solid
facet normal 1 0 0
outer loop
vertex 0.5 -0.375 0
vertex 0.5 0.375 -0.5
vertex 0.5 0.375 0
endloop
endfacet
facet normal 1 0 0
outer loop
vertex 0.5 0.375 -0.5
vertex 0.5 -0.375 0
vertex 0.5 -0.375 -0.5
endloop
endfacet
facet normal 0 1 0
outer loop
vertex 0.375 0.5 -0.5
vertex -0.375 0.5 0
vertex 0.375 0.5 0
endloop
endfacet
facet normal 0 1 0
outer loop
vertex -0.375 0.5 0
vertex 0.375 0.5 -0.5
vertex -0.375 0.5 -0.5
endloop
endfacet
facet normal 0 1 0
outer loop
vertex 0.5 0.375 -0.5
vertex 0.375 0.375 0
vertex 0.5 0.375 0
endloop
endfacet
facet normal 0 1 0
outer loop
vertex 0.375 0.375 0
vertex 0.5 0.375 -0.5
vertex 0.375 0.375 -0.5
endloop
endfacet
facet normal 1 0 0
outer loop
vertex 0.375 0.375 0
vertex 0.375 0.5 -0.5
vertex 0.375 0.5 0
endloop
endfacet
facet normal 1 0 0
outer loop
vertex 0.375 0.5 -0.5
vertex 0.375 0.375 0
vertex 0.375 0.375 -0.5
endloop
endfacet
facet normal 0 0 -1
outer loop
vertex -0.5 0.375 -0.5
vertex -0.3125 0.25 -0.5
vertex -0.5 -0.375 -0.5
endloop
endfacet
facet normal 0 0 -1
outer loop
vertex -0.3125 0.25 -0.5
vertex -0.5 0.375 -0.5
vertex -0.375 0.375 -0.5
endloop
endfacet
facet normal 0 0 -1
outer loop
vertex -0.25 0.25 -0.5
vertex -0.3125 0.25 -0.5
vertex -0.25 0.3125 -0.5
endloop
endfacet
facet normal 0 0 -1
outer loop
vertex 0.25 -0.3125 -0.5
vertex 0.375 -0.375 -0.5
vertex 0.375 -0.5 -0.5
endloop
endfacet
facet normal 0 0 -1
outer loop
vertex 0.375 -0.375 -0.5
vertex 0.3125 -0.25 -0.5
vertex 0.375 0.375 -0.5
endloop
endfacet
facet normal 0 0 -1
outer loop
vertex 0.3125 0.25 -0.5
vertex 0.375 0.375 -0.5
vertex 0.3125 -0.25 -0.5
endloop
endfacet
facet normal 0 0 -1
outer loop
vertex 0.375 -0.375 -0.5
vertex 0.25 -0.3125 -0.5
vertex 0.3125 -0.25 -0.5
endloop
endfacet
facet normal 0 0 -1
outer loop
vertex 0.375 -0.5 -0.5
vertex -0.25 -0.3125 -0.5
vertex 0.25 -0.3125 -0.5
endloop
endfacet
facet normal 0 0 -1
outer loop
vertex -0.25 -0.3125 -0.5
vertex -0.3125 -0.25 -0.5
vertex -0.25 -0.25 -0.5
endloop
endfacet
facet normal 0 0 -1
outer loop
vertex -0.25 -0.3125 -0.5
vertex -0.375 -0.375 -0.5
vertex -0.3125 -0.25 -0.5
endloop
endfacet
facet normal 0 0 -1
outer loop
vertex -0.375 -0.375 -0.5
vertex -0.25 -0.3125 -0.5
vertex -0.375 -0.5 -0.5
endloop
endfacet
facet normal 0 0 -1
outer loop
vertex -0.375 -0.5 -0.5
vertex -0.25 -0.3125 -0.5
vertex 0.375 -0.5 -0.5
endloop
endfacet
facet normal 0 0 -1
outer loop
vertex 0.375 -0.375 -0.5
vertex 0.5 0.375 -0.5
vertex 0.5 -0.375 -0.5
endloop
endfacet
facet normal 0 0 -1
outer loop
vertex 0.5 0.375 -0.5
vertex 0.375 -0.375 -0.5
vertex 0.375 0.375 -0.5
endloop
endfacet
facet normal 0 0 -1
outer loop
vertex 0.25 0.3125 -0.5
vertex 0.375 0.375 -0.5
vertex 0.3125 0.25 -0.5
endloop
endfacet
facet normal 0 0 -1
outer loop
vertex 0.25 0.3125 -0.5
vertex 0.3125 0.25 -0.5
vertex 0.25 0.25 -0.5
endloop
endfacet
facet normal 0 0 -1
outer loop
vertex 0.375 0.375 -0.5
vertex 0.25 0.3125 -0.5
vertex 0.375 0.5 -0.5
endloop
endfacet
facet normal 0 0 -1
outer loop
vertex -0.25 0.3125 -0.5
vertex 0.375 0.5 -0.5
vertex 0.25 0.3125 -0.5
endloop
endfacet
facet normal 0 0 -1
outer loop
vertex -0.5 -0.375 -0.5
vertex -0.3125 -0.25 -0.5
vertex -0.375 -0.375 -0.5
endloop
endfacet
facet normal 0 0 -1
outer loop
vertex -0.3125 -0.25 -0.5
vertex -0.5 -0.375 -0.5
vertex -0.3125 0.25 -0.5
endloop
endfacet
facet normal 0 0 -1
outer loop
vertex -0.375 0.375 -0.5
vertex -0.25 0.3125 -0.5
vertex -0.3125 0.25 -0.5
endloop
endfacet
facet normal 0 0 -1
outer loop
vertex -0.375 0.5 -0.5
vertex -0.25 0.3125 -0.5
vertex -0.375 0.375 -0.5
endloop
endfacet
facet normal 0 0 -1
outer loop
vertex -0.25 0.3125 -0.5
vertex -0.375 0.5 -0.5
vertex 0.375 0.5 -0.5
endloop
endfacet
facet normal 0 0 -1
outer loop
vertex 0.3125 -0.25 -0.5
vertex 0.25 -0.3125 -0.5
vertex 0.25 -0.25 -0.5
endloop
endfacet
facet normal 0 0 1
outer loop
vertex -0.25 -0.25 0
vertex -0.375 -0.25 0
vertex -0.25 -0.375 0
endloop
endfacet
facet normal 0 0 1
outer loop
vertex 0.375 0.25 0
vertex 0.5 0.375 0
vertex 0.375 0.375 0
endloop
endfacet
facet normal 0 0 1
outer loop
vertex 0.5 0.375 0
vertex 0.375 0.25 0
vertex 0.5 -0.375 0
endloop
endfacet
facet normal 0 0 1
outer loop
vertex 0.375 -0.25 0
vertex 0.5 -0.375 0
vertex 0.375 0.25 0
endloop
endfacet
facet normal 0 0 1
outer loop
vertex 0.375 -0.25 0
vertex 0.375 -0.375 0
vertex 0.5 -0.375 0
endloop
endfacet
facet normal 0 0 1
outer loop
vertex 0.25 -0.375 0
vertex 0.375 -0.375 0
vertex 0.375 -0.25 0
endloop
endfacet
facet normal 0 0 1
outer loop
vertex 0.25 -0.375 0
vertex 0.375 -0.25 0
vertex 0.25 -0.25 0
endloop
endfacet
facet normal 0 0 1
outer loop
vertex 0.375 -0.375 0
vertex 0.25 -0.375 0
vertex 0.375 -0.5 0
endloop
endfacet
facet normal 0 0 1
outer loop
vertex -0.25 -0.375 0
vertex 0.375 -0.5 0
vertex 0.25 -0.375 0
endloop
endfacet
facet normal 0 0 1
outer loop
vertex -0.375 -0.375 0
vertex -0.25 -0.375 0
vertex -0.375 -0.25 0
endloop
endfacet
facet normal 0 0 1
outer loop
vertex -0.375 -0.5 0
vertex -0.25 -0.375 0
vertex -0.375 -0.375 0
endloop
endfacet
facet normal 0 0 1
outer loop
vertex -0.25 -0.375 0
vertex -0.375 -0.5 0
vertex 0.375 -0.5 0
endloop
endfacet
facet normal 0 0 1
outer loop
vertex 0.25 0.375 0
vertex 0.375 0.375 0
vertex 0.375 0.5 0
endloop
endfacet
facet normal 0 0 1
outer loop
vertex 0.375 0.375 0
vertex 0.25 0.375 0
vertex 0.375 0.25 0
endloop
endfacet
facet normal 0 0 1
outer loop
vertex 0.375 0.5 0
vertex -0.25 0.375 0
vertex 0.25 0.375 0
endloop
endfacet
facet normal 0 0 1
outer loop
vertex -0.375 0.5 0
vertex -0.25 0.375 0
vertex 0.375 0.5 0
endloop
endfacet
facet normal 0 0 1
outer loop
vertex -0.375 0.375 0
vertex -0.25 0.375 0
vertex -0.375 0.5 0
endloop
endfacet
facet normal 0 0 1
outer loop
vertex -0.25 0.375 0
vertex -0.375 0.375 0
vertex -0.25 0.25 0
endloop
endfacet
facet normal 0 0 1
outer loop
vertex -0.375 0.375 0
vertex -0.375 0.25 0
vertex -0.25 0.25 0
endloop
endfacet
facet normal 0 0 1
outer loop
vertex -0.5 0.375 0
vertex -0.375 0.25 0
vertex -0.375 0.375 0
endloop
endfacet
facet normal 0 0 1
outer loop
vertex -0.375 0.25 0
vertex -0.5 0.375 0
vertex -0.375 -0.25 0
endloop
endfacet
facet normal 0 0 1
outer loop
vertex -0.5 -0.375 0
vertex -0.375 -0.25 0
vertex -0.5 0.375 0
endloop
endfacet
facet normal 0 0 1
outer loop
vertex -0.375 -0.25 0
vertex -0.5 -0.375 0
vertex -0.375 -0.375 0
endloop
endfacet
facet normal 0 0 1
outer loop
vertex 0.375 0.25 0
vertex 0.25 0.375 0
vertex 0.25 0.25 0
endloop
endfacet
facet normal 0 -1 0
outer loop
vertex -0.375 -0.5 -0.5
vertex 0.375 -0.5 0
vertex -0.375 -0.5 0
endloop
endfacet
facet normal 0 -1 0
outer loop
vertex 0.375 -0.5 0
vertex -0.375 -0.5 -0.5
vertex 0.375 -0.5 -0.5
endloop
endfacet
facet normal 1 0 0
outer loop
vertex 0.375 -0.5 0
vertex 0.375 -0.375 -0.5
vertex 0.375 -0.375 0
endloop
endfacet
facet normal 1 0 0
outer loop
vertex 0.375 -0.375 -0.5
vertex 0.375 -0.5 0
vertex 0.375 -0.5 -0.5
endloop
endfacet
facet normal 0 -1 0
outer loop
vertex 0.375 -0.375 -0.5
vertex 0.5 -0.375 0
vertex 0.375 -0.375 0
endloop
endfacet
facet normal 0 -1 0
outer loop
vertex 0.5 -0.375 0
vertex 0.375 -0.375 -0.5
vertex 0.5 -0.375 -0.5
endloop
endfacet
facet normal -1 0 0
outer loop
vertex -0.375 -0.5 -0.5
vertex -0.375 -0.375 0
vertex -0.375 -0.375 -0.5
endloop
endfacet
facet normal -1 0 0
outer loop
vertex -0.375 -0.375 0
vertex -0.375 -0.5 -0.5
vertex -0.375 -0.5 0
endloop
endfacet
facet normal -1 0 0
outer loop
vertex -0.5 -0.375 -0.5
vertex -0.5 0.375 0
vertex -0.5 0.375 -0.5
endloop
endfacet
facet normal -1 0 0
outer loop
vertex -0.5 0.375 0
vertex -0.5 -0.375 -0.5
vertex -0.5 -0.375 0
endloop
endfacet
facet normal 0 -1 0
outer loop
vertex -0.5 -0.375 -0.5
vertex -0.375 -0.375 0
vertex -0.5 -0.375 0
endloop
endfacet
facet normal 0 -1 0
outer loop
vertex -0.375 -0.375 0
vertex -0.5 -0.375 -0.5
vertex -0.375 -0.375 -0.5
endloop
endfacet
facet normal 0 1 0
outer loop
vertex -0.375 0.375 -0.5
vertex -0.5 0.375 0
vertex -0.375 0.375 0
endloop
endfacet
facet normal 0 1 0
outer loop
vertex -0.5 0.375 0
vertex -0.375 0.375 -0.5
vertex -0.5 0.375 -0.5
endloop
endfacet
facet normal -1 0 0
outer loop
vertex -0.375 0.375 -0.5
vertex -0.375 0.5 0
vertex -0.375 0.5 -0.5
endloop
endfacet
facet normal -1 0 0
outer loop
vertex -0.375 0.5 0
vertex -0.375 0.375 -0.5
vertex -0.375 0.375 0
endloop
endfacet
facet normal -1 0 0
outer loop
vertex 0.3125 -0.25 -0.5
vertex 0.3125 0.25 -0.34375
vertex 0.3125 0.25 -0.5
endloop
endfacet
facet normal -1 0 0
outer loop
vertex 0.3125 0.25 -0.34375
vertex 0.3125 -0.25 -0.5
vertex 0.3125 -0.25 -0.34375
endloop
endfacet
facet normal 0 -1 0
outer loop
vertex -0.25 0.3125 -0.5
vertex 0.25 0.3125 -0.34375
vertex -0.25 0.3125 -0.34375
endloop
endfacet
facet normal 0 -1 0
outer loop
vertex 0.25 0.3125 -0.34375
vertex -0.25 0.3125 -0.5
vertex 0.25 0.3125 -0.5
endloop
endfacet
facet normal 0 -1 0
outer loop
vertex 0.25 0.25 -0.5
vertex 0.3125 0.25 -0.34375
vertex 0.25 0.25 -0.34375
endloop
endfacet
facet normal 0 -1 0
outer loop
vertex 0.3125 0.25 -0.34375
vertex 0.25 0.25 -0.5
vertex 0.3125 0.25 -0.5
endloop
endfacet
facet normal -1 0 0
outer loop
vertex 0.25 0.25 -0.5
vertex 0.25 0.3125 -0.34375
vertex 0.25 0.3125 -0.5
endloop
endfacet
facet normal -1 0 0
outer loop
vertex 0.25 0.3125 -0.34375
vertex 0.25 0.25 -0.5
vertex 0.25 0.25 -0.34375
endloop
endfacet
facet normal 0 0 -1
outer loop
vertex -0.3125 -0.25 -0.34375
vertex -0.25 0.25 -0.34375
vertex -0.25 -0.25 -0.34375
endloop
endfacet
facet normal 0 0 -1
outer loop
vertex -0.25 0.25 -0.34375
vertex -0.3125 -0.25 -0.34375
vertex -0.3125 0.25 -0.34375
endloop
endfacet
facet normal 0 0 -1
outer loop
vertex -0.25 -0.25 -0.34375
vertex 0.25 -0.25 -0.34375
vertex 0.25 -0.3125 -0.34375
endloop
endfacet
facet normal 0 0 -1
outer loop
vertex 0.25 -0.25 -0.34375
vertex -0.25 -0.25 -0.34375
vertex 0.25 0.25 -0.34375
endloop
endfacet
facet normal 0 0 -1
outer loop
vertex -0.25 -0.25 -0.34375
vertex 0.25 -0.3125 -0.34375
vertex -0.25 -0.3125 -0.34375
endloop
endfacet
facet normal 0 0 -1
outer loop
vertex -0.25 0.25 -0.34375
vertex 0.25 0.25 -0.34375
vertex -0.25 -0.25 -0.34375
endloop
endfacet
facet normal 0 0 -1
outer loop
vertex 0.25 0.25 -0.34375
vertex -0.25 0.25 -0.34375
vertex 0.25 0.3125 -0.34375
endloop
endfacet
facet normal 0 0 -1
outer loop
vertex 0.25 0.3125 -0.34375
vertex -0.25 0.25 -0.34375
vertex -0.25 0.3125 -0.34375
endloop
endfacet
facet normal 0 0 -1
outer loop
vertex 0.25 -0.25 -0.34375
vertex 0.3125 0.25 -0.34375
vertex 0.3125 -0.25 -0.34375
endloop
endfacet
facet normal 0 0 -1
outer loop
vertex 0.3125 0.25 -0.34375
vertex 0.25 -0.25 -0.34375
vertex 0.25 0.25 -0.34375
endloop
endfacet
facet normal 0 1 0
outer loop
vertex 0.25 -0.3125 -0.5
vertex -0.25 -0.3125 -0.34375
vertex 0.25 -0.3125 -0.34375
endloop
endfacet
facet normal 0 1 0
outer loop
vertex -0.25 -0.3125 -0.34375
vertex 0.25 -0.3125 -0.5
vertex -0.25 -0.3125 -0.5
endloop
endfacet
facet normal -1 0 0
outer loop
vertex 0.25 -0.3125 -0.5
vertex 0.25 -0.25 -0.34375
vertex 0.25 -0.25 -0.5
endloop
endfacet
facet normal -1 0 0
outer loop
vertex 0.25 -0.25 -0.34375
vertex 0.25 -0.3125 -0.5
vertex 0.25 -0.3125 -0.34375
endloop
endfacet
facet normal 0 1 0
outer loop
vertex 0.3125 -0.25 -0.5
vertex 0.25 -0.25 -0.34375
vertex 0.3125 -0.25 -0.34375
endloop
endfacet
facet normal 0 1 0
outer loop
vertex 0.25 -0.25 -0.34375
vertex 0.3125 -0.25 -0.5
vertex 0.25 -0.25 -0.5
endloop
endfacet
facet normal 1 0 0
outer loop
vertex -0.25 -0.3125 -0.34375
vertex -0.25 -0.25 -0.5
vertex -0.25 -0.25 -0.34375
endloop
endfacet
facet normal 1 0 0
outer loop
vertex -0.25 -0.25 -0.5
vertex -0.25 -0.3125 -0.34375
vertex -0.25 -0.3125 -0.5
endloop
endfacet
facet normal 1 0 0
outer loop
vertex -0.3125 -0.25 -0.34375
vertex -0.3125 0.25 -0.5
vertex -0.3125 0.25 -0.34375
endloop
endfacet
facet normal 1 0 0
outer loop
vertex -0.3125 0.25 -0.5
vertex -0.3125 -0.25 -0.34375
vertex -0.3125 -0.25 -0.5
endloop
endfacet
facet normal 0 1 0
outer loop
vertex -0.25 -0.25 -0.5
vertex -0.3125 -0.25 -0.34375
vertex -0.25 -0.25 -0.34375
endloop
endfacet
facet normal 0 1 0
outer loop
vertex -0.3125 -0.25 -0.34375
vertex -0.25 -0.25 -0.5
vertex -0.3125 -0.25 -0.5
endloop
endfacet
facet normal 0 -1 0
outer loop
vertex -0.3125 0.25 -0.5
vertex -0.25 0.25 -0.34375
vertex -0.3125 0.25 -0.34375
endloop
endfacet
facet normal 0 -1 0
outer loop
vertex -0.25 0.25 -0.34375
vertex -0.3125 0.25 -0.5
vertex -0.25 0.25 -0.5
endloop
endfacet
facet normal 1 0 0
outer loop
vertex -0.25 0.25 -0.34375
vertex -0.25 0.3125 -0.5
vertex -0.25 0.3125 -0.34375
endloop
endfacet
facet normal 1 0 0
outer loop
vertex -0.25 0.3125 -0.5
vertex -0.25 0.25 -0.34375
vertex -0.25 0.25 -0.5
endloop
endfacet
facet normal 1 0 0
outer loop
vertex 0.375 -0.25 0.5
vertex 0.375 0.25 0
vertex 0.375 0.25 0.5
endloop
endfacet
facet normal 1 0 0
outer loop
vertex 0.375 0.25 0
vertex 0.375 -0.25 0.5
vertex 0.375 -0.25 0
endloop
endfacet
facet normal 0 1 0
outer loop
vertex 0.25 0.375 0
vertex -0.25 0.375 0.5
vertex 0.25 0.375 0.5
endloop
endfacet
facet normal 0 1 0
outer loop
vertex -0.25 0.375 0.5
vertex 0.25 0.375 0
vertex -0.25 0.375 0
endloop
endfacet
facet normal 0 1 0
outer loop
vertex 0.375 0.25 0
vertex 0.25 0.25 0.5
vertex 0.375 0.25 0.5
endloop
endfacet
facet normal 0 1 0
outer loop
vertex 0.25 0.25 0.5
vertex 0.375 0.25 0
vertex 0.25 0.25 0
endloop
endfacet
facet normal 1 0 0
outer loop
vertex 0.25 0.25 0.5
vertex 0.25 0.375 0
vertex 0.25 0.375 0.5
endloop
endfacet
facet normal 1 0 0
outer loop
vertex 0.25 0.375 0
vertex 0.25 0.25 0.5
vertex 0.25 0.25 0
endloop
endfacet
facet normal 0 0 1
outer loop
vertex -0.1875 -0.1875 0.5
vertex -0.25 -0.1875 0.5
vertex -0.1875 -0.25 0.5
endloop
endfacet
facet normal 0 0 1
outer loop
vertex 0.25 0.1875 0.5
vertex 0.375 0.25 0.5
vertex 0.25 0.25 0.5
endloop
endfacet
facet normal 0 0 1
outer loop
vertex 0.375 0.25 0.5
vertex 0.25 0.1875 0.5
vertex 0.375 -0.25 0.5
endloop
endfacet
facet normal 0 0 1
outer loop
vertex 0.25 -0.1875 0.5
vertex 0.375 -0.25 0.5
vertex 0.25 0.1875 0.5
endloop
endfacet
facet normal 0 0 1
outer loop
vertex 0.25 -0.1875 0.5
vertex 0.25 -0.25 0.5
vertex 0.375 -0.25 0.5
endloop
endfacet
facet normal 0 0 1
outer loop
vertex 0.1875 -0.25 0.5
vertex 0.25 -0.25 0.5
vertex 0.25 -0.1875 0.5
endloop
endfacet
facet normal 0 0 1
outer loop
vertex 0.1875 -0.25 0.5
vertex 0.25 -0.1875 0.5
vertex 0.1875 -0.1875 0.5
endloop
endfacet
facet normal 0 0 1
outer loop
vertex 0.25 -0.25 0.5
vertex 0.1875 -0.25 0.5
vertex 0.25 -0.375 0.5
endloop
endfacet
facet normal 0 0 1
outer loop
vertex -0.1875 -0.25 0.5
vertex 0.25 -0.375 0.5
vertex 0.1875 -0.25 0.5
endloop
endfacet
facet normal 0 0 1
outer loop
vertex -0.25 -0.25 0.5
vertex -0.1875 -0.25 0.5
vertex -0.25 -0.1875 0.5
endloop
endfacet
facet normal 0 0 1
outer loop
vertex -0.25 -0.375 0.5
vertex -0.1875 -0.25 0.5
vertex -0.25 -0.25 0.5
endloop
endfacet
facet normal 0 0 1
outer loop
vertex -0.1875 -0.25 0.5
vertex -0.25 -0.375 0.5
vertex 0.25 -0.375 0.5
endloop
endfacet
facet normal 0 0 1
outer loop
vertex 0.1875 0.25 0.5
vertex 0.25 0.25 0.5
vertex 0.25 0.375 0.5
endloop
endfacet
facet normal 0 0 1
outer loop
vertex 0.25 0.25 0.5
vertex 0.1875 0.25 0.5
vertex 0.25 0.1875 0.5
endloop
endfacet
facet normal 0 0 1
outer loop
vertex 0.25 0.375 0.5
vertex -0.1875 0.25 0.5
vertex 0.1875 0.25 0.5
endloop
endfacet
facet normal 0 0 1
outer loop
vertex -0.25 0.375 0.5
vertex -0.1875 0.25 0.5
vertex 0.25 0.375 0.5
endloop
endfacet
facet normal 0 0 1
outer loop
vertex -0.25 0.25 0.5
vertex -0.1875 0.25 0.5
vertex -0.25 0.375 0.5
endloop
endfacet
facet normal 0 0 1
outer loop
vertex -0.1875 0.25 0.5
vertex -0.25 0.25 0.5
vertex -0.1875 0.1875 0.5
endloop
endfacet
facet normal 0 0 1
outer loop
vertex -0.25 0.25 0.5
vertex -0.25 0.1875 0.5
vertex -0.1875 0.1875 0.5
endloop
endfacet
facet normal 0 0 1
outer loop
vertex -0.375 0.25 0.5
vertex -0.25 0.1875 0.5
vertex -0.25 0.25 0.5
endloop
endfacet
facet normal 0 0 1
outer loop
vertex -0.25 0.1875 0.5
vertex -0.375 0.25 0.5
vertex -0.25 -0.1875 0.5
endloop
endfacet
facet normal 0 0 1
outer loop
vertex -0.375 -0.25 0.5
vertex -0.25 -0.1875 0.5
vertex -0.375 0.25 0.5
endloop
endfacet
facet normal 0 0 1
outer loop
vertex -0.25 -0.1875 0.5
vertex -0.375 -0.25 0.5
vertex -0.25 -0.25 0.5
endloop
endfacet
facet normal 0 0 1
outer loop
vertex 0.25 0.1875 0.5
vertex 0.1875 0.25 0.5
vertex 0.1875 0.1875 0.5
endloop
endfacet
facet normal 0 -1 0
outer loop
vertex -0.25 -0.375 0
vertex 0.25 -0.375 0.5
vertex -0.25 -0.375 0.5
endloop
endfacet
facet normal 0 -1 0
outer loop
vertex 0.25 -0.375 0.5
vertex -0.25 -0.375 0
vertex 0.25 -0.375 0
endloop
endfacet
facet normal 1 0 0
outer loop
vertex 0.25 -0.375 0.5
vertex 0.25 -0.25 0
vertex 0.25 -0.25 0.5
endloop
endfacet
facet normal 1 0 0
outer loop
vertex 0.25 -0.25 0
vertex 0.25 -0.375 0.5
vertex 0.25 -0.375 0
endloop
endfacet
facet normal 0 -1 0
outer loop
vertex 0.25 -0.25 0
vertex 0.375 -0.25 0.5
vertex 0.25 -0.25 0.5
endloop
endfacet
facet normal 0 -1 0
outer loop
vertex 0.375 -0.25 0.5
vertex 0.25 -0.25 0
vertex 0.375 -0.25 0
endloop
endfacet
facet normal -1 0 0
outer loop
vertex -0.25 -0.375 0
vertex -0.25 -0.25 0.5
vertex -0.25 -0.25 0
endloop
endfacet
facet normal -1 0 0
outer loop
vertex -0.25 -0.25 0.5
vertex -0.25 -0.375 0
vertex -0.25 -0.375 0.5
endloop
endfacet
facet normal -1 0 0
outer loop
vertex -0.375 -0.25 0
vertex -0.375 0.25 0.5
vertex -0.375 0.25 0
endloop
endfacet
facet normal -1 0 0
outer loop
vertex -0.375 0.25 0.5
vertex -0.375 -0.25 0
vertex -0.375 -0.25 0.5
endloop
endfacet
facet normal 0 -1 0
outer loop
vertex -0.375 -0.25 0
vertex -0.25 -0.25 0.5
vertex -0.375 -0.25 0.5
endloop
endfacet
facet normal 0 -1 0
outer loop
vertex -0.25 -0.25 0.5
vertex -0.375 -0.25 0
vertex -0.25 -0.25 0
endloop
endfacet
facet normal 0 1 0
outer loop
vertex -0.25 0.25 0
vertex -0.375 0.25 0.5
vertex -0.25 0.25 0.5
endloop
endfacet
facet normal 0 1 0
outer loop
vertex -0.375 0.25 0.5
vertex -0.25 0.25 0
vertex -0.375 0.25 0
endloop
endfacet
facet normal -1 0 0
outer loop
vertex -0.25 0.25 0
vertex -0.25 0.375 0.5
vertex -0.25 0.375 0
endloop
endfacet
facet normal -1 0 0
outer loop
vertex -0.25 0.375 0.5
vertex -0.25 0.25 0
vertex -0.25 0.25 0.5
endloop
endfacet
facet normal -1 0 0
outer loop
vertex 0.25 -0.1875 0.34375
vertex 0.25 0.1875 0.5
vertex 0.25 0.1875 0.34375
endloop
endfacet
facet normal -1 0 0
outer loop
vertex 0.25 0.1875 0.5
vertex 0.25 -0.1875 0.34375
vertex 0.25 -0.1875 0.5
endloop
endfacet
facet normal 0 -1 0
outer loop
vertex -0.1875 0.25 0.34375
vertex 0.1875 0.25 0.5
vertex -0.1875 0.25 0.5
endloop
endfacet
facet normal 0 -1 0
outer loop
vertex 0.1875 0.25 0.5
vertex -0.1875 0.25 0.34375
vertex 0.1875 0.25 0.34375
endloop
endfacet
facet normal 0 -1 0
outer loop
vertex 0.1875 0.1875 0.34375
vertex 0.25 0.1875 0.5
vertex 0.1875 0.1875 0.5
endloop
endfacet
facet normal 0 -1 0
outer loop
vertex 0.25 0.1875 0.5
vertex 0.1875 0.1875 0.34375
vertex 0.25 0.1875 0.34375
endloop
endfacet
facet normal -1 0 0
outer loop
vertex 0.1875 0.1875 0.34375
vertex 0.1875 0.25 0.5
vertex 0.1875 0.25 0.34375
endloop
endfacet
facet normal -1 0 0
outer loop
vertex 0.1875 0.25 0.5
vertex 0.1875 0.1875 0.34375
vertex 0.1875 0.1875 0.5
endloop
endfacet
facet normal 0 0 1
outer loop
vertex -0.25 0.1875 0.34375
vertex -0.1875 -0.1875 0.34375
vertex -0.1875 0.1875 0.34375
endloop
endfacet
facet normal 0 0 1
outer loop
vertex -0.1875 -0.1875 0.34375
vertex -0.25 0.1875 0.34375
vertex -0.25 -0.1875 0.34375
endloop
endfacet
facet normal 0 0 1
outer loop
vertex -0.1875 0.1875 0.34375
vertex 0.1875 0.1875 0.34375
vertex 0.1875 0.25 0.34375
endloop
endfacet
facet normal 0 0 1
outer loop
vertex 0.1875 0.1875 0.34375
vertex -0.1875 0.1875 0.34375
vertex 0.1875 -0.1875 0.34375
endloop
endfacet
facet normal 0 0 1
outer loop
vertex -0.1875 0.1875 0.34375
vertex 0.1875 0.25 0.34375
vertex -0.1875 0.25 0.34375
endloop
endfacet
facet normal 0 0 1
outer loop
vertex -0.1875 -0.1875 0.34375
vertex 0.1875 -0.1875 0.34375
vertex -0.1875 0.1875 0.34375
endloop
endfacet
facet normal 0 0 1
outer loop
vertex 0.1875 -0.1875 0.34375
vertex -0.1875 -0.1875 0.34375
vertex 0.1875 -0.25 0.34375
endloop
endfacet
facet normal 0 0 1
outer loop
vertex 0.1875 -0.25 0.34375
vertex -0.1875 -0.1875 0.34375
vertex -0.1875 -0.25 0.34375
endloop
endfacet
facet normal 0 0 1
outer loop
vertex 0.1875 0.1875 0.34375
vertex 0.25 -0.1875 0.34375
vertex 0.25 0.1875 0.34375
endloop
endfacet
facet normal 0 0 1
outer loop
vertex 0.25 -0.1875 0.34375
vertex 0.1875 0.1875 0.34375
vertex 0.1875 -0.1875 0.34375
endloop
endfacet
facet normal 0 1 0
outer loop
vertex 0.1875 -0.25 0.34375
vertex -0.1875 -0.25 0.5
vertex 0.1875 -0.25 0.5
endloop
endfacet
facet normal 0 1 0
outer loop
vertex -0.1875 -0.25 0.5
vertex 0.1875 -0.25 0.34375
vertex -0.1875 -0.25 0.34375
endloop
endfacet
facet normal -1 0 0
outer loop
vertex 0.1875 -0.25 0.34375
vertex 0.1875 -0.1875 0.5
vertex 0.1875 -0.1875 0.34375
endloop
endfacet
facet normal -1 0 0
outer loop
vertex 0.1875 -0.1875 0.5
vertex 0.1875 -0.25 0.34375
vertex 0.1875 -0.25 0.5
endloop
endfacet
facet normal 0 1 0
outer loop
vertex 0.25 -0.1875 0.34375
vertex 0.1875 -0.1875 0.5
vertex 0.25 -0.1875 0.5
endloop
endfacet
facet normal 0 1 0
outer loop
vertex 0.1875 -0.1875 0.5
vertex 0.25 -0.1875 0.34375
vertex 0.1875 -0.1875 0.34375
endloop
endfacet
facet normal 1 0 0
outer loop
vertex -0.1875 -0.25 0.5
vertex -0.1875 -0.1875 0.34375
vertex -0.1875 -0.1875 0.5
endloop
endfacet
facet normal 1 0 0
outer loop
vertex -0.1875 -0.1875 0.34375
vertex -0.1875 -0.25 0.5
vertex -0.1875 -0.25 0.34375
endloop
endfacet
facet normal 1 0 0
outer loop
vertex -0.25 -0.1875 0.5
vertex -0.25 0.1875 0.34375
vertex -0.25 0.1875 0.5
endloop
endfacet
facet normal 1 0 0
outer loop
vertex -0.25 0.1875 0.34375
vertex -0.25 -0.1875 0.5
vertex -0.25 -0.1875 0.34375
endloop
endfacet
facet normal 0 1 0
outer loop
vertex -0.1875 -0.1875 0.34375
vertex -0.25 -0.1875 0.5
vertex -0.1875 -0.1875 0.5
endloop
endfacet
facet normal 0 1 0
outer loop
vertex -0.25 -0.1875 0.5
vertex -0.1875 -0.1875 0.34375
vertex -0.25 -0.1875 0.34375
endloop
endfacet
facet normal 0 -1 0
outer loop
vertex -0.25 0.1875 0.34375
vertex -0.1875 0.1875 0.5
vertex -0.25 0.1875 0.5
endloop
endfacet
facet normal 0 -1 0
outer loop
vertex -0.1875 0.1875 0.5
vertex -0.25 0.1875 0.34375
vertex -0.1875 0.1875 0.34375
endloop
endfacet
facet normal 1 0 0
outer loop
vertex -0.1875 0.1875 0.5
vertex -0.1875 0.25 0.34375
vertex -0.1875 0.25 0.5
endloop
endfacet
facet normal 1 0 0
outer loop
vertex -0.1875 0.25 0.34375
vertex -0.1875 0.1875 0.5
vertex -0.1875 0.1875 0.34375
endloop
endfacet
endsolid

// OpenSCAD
module cyl(h, r, c) {
    difference() {
        cube([r, h, r], center = true);
        for(i = [0 : 90 : 360])
            rotate(i, [0, 1, 0])
                translate([r/2 - c/2, 0, r/2 - c/2])
                    cube([c, h, c], center = true);
    }
}

rotate(-90, [1, 0, 0]) {
    difference() {
        translate([0, 4/16, 0])
            cyl(8/16, 1, 2/16);
        translate([0, 7/16, 0])
            cyl(3/16, 10/16, 1/16);
    }
    difference() {
        translate([0, -4/16, 0])
            cyl(8/16, 12/16, 2/16);
        translate([0, -7/16, 0])
            cyl(3/16, 8/16, 1/16);
    }
}
